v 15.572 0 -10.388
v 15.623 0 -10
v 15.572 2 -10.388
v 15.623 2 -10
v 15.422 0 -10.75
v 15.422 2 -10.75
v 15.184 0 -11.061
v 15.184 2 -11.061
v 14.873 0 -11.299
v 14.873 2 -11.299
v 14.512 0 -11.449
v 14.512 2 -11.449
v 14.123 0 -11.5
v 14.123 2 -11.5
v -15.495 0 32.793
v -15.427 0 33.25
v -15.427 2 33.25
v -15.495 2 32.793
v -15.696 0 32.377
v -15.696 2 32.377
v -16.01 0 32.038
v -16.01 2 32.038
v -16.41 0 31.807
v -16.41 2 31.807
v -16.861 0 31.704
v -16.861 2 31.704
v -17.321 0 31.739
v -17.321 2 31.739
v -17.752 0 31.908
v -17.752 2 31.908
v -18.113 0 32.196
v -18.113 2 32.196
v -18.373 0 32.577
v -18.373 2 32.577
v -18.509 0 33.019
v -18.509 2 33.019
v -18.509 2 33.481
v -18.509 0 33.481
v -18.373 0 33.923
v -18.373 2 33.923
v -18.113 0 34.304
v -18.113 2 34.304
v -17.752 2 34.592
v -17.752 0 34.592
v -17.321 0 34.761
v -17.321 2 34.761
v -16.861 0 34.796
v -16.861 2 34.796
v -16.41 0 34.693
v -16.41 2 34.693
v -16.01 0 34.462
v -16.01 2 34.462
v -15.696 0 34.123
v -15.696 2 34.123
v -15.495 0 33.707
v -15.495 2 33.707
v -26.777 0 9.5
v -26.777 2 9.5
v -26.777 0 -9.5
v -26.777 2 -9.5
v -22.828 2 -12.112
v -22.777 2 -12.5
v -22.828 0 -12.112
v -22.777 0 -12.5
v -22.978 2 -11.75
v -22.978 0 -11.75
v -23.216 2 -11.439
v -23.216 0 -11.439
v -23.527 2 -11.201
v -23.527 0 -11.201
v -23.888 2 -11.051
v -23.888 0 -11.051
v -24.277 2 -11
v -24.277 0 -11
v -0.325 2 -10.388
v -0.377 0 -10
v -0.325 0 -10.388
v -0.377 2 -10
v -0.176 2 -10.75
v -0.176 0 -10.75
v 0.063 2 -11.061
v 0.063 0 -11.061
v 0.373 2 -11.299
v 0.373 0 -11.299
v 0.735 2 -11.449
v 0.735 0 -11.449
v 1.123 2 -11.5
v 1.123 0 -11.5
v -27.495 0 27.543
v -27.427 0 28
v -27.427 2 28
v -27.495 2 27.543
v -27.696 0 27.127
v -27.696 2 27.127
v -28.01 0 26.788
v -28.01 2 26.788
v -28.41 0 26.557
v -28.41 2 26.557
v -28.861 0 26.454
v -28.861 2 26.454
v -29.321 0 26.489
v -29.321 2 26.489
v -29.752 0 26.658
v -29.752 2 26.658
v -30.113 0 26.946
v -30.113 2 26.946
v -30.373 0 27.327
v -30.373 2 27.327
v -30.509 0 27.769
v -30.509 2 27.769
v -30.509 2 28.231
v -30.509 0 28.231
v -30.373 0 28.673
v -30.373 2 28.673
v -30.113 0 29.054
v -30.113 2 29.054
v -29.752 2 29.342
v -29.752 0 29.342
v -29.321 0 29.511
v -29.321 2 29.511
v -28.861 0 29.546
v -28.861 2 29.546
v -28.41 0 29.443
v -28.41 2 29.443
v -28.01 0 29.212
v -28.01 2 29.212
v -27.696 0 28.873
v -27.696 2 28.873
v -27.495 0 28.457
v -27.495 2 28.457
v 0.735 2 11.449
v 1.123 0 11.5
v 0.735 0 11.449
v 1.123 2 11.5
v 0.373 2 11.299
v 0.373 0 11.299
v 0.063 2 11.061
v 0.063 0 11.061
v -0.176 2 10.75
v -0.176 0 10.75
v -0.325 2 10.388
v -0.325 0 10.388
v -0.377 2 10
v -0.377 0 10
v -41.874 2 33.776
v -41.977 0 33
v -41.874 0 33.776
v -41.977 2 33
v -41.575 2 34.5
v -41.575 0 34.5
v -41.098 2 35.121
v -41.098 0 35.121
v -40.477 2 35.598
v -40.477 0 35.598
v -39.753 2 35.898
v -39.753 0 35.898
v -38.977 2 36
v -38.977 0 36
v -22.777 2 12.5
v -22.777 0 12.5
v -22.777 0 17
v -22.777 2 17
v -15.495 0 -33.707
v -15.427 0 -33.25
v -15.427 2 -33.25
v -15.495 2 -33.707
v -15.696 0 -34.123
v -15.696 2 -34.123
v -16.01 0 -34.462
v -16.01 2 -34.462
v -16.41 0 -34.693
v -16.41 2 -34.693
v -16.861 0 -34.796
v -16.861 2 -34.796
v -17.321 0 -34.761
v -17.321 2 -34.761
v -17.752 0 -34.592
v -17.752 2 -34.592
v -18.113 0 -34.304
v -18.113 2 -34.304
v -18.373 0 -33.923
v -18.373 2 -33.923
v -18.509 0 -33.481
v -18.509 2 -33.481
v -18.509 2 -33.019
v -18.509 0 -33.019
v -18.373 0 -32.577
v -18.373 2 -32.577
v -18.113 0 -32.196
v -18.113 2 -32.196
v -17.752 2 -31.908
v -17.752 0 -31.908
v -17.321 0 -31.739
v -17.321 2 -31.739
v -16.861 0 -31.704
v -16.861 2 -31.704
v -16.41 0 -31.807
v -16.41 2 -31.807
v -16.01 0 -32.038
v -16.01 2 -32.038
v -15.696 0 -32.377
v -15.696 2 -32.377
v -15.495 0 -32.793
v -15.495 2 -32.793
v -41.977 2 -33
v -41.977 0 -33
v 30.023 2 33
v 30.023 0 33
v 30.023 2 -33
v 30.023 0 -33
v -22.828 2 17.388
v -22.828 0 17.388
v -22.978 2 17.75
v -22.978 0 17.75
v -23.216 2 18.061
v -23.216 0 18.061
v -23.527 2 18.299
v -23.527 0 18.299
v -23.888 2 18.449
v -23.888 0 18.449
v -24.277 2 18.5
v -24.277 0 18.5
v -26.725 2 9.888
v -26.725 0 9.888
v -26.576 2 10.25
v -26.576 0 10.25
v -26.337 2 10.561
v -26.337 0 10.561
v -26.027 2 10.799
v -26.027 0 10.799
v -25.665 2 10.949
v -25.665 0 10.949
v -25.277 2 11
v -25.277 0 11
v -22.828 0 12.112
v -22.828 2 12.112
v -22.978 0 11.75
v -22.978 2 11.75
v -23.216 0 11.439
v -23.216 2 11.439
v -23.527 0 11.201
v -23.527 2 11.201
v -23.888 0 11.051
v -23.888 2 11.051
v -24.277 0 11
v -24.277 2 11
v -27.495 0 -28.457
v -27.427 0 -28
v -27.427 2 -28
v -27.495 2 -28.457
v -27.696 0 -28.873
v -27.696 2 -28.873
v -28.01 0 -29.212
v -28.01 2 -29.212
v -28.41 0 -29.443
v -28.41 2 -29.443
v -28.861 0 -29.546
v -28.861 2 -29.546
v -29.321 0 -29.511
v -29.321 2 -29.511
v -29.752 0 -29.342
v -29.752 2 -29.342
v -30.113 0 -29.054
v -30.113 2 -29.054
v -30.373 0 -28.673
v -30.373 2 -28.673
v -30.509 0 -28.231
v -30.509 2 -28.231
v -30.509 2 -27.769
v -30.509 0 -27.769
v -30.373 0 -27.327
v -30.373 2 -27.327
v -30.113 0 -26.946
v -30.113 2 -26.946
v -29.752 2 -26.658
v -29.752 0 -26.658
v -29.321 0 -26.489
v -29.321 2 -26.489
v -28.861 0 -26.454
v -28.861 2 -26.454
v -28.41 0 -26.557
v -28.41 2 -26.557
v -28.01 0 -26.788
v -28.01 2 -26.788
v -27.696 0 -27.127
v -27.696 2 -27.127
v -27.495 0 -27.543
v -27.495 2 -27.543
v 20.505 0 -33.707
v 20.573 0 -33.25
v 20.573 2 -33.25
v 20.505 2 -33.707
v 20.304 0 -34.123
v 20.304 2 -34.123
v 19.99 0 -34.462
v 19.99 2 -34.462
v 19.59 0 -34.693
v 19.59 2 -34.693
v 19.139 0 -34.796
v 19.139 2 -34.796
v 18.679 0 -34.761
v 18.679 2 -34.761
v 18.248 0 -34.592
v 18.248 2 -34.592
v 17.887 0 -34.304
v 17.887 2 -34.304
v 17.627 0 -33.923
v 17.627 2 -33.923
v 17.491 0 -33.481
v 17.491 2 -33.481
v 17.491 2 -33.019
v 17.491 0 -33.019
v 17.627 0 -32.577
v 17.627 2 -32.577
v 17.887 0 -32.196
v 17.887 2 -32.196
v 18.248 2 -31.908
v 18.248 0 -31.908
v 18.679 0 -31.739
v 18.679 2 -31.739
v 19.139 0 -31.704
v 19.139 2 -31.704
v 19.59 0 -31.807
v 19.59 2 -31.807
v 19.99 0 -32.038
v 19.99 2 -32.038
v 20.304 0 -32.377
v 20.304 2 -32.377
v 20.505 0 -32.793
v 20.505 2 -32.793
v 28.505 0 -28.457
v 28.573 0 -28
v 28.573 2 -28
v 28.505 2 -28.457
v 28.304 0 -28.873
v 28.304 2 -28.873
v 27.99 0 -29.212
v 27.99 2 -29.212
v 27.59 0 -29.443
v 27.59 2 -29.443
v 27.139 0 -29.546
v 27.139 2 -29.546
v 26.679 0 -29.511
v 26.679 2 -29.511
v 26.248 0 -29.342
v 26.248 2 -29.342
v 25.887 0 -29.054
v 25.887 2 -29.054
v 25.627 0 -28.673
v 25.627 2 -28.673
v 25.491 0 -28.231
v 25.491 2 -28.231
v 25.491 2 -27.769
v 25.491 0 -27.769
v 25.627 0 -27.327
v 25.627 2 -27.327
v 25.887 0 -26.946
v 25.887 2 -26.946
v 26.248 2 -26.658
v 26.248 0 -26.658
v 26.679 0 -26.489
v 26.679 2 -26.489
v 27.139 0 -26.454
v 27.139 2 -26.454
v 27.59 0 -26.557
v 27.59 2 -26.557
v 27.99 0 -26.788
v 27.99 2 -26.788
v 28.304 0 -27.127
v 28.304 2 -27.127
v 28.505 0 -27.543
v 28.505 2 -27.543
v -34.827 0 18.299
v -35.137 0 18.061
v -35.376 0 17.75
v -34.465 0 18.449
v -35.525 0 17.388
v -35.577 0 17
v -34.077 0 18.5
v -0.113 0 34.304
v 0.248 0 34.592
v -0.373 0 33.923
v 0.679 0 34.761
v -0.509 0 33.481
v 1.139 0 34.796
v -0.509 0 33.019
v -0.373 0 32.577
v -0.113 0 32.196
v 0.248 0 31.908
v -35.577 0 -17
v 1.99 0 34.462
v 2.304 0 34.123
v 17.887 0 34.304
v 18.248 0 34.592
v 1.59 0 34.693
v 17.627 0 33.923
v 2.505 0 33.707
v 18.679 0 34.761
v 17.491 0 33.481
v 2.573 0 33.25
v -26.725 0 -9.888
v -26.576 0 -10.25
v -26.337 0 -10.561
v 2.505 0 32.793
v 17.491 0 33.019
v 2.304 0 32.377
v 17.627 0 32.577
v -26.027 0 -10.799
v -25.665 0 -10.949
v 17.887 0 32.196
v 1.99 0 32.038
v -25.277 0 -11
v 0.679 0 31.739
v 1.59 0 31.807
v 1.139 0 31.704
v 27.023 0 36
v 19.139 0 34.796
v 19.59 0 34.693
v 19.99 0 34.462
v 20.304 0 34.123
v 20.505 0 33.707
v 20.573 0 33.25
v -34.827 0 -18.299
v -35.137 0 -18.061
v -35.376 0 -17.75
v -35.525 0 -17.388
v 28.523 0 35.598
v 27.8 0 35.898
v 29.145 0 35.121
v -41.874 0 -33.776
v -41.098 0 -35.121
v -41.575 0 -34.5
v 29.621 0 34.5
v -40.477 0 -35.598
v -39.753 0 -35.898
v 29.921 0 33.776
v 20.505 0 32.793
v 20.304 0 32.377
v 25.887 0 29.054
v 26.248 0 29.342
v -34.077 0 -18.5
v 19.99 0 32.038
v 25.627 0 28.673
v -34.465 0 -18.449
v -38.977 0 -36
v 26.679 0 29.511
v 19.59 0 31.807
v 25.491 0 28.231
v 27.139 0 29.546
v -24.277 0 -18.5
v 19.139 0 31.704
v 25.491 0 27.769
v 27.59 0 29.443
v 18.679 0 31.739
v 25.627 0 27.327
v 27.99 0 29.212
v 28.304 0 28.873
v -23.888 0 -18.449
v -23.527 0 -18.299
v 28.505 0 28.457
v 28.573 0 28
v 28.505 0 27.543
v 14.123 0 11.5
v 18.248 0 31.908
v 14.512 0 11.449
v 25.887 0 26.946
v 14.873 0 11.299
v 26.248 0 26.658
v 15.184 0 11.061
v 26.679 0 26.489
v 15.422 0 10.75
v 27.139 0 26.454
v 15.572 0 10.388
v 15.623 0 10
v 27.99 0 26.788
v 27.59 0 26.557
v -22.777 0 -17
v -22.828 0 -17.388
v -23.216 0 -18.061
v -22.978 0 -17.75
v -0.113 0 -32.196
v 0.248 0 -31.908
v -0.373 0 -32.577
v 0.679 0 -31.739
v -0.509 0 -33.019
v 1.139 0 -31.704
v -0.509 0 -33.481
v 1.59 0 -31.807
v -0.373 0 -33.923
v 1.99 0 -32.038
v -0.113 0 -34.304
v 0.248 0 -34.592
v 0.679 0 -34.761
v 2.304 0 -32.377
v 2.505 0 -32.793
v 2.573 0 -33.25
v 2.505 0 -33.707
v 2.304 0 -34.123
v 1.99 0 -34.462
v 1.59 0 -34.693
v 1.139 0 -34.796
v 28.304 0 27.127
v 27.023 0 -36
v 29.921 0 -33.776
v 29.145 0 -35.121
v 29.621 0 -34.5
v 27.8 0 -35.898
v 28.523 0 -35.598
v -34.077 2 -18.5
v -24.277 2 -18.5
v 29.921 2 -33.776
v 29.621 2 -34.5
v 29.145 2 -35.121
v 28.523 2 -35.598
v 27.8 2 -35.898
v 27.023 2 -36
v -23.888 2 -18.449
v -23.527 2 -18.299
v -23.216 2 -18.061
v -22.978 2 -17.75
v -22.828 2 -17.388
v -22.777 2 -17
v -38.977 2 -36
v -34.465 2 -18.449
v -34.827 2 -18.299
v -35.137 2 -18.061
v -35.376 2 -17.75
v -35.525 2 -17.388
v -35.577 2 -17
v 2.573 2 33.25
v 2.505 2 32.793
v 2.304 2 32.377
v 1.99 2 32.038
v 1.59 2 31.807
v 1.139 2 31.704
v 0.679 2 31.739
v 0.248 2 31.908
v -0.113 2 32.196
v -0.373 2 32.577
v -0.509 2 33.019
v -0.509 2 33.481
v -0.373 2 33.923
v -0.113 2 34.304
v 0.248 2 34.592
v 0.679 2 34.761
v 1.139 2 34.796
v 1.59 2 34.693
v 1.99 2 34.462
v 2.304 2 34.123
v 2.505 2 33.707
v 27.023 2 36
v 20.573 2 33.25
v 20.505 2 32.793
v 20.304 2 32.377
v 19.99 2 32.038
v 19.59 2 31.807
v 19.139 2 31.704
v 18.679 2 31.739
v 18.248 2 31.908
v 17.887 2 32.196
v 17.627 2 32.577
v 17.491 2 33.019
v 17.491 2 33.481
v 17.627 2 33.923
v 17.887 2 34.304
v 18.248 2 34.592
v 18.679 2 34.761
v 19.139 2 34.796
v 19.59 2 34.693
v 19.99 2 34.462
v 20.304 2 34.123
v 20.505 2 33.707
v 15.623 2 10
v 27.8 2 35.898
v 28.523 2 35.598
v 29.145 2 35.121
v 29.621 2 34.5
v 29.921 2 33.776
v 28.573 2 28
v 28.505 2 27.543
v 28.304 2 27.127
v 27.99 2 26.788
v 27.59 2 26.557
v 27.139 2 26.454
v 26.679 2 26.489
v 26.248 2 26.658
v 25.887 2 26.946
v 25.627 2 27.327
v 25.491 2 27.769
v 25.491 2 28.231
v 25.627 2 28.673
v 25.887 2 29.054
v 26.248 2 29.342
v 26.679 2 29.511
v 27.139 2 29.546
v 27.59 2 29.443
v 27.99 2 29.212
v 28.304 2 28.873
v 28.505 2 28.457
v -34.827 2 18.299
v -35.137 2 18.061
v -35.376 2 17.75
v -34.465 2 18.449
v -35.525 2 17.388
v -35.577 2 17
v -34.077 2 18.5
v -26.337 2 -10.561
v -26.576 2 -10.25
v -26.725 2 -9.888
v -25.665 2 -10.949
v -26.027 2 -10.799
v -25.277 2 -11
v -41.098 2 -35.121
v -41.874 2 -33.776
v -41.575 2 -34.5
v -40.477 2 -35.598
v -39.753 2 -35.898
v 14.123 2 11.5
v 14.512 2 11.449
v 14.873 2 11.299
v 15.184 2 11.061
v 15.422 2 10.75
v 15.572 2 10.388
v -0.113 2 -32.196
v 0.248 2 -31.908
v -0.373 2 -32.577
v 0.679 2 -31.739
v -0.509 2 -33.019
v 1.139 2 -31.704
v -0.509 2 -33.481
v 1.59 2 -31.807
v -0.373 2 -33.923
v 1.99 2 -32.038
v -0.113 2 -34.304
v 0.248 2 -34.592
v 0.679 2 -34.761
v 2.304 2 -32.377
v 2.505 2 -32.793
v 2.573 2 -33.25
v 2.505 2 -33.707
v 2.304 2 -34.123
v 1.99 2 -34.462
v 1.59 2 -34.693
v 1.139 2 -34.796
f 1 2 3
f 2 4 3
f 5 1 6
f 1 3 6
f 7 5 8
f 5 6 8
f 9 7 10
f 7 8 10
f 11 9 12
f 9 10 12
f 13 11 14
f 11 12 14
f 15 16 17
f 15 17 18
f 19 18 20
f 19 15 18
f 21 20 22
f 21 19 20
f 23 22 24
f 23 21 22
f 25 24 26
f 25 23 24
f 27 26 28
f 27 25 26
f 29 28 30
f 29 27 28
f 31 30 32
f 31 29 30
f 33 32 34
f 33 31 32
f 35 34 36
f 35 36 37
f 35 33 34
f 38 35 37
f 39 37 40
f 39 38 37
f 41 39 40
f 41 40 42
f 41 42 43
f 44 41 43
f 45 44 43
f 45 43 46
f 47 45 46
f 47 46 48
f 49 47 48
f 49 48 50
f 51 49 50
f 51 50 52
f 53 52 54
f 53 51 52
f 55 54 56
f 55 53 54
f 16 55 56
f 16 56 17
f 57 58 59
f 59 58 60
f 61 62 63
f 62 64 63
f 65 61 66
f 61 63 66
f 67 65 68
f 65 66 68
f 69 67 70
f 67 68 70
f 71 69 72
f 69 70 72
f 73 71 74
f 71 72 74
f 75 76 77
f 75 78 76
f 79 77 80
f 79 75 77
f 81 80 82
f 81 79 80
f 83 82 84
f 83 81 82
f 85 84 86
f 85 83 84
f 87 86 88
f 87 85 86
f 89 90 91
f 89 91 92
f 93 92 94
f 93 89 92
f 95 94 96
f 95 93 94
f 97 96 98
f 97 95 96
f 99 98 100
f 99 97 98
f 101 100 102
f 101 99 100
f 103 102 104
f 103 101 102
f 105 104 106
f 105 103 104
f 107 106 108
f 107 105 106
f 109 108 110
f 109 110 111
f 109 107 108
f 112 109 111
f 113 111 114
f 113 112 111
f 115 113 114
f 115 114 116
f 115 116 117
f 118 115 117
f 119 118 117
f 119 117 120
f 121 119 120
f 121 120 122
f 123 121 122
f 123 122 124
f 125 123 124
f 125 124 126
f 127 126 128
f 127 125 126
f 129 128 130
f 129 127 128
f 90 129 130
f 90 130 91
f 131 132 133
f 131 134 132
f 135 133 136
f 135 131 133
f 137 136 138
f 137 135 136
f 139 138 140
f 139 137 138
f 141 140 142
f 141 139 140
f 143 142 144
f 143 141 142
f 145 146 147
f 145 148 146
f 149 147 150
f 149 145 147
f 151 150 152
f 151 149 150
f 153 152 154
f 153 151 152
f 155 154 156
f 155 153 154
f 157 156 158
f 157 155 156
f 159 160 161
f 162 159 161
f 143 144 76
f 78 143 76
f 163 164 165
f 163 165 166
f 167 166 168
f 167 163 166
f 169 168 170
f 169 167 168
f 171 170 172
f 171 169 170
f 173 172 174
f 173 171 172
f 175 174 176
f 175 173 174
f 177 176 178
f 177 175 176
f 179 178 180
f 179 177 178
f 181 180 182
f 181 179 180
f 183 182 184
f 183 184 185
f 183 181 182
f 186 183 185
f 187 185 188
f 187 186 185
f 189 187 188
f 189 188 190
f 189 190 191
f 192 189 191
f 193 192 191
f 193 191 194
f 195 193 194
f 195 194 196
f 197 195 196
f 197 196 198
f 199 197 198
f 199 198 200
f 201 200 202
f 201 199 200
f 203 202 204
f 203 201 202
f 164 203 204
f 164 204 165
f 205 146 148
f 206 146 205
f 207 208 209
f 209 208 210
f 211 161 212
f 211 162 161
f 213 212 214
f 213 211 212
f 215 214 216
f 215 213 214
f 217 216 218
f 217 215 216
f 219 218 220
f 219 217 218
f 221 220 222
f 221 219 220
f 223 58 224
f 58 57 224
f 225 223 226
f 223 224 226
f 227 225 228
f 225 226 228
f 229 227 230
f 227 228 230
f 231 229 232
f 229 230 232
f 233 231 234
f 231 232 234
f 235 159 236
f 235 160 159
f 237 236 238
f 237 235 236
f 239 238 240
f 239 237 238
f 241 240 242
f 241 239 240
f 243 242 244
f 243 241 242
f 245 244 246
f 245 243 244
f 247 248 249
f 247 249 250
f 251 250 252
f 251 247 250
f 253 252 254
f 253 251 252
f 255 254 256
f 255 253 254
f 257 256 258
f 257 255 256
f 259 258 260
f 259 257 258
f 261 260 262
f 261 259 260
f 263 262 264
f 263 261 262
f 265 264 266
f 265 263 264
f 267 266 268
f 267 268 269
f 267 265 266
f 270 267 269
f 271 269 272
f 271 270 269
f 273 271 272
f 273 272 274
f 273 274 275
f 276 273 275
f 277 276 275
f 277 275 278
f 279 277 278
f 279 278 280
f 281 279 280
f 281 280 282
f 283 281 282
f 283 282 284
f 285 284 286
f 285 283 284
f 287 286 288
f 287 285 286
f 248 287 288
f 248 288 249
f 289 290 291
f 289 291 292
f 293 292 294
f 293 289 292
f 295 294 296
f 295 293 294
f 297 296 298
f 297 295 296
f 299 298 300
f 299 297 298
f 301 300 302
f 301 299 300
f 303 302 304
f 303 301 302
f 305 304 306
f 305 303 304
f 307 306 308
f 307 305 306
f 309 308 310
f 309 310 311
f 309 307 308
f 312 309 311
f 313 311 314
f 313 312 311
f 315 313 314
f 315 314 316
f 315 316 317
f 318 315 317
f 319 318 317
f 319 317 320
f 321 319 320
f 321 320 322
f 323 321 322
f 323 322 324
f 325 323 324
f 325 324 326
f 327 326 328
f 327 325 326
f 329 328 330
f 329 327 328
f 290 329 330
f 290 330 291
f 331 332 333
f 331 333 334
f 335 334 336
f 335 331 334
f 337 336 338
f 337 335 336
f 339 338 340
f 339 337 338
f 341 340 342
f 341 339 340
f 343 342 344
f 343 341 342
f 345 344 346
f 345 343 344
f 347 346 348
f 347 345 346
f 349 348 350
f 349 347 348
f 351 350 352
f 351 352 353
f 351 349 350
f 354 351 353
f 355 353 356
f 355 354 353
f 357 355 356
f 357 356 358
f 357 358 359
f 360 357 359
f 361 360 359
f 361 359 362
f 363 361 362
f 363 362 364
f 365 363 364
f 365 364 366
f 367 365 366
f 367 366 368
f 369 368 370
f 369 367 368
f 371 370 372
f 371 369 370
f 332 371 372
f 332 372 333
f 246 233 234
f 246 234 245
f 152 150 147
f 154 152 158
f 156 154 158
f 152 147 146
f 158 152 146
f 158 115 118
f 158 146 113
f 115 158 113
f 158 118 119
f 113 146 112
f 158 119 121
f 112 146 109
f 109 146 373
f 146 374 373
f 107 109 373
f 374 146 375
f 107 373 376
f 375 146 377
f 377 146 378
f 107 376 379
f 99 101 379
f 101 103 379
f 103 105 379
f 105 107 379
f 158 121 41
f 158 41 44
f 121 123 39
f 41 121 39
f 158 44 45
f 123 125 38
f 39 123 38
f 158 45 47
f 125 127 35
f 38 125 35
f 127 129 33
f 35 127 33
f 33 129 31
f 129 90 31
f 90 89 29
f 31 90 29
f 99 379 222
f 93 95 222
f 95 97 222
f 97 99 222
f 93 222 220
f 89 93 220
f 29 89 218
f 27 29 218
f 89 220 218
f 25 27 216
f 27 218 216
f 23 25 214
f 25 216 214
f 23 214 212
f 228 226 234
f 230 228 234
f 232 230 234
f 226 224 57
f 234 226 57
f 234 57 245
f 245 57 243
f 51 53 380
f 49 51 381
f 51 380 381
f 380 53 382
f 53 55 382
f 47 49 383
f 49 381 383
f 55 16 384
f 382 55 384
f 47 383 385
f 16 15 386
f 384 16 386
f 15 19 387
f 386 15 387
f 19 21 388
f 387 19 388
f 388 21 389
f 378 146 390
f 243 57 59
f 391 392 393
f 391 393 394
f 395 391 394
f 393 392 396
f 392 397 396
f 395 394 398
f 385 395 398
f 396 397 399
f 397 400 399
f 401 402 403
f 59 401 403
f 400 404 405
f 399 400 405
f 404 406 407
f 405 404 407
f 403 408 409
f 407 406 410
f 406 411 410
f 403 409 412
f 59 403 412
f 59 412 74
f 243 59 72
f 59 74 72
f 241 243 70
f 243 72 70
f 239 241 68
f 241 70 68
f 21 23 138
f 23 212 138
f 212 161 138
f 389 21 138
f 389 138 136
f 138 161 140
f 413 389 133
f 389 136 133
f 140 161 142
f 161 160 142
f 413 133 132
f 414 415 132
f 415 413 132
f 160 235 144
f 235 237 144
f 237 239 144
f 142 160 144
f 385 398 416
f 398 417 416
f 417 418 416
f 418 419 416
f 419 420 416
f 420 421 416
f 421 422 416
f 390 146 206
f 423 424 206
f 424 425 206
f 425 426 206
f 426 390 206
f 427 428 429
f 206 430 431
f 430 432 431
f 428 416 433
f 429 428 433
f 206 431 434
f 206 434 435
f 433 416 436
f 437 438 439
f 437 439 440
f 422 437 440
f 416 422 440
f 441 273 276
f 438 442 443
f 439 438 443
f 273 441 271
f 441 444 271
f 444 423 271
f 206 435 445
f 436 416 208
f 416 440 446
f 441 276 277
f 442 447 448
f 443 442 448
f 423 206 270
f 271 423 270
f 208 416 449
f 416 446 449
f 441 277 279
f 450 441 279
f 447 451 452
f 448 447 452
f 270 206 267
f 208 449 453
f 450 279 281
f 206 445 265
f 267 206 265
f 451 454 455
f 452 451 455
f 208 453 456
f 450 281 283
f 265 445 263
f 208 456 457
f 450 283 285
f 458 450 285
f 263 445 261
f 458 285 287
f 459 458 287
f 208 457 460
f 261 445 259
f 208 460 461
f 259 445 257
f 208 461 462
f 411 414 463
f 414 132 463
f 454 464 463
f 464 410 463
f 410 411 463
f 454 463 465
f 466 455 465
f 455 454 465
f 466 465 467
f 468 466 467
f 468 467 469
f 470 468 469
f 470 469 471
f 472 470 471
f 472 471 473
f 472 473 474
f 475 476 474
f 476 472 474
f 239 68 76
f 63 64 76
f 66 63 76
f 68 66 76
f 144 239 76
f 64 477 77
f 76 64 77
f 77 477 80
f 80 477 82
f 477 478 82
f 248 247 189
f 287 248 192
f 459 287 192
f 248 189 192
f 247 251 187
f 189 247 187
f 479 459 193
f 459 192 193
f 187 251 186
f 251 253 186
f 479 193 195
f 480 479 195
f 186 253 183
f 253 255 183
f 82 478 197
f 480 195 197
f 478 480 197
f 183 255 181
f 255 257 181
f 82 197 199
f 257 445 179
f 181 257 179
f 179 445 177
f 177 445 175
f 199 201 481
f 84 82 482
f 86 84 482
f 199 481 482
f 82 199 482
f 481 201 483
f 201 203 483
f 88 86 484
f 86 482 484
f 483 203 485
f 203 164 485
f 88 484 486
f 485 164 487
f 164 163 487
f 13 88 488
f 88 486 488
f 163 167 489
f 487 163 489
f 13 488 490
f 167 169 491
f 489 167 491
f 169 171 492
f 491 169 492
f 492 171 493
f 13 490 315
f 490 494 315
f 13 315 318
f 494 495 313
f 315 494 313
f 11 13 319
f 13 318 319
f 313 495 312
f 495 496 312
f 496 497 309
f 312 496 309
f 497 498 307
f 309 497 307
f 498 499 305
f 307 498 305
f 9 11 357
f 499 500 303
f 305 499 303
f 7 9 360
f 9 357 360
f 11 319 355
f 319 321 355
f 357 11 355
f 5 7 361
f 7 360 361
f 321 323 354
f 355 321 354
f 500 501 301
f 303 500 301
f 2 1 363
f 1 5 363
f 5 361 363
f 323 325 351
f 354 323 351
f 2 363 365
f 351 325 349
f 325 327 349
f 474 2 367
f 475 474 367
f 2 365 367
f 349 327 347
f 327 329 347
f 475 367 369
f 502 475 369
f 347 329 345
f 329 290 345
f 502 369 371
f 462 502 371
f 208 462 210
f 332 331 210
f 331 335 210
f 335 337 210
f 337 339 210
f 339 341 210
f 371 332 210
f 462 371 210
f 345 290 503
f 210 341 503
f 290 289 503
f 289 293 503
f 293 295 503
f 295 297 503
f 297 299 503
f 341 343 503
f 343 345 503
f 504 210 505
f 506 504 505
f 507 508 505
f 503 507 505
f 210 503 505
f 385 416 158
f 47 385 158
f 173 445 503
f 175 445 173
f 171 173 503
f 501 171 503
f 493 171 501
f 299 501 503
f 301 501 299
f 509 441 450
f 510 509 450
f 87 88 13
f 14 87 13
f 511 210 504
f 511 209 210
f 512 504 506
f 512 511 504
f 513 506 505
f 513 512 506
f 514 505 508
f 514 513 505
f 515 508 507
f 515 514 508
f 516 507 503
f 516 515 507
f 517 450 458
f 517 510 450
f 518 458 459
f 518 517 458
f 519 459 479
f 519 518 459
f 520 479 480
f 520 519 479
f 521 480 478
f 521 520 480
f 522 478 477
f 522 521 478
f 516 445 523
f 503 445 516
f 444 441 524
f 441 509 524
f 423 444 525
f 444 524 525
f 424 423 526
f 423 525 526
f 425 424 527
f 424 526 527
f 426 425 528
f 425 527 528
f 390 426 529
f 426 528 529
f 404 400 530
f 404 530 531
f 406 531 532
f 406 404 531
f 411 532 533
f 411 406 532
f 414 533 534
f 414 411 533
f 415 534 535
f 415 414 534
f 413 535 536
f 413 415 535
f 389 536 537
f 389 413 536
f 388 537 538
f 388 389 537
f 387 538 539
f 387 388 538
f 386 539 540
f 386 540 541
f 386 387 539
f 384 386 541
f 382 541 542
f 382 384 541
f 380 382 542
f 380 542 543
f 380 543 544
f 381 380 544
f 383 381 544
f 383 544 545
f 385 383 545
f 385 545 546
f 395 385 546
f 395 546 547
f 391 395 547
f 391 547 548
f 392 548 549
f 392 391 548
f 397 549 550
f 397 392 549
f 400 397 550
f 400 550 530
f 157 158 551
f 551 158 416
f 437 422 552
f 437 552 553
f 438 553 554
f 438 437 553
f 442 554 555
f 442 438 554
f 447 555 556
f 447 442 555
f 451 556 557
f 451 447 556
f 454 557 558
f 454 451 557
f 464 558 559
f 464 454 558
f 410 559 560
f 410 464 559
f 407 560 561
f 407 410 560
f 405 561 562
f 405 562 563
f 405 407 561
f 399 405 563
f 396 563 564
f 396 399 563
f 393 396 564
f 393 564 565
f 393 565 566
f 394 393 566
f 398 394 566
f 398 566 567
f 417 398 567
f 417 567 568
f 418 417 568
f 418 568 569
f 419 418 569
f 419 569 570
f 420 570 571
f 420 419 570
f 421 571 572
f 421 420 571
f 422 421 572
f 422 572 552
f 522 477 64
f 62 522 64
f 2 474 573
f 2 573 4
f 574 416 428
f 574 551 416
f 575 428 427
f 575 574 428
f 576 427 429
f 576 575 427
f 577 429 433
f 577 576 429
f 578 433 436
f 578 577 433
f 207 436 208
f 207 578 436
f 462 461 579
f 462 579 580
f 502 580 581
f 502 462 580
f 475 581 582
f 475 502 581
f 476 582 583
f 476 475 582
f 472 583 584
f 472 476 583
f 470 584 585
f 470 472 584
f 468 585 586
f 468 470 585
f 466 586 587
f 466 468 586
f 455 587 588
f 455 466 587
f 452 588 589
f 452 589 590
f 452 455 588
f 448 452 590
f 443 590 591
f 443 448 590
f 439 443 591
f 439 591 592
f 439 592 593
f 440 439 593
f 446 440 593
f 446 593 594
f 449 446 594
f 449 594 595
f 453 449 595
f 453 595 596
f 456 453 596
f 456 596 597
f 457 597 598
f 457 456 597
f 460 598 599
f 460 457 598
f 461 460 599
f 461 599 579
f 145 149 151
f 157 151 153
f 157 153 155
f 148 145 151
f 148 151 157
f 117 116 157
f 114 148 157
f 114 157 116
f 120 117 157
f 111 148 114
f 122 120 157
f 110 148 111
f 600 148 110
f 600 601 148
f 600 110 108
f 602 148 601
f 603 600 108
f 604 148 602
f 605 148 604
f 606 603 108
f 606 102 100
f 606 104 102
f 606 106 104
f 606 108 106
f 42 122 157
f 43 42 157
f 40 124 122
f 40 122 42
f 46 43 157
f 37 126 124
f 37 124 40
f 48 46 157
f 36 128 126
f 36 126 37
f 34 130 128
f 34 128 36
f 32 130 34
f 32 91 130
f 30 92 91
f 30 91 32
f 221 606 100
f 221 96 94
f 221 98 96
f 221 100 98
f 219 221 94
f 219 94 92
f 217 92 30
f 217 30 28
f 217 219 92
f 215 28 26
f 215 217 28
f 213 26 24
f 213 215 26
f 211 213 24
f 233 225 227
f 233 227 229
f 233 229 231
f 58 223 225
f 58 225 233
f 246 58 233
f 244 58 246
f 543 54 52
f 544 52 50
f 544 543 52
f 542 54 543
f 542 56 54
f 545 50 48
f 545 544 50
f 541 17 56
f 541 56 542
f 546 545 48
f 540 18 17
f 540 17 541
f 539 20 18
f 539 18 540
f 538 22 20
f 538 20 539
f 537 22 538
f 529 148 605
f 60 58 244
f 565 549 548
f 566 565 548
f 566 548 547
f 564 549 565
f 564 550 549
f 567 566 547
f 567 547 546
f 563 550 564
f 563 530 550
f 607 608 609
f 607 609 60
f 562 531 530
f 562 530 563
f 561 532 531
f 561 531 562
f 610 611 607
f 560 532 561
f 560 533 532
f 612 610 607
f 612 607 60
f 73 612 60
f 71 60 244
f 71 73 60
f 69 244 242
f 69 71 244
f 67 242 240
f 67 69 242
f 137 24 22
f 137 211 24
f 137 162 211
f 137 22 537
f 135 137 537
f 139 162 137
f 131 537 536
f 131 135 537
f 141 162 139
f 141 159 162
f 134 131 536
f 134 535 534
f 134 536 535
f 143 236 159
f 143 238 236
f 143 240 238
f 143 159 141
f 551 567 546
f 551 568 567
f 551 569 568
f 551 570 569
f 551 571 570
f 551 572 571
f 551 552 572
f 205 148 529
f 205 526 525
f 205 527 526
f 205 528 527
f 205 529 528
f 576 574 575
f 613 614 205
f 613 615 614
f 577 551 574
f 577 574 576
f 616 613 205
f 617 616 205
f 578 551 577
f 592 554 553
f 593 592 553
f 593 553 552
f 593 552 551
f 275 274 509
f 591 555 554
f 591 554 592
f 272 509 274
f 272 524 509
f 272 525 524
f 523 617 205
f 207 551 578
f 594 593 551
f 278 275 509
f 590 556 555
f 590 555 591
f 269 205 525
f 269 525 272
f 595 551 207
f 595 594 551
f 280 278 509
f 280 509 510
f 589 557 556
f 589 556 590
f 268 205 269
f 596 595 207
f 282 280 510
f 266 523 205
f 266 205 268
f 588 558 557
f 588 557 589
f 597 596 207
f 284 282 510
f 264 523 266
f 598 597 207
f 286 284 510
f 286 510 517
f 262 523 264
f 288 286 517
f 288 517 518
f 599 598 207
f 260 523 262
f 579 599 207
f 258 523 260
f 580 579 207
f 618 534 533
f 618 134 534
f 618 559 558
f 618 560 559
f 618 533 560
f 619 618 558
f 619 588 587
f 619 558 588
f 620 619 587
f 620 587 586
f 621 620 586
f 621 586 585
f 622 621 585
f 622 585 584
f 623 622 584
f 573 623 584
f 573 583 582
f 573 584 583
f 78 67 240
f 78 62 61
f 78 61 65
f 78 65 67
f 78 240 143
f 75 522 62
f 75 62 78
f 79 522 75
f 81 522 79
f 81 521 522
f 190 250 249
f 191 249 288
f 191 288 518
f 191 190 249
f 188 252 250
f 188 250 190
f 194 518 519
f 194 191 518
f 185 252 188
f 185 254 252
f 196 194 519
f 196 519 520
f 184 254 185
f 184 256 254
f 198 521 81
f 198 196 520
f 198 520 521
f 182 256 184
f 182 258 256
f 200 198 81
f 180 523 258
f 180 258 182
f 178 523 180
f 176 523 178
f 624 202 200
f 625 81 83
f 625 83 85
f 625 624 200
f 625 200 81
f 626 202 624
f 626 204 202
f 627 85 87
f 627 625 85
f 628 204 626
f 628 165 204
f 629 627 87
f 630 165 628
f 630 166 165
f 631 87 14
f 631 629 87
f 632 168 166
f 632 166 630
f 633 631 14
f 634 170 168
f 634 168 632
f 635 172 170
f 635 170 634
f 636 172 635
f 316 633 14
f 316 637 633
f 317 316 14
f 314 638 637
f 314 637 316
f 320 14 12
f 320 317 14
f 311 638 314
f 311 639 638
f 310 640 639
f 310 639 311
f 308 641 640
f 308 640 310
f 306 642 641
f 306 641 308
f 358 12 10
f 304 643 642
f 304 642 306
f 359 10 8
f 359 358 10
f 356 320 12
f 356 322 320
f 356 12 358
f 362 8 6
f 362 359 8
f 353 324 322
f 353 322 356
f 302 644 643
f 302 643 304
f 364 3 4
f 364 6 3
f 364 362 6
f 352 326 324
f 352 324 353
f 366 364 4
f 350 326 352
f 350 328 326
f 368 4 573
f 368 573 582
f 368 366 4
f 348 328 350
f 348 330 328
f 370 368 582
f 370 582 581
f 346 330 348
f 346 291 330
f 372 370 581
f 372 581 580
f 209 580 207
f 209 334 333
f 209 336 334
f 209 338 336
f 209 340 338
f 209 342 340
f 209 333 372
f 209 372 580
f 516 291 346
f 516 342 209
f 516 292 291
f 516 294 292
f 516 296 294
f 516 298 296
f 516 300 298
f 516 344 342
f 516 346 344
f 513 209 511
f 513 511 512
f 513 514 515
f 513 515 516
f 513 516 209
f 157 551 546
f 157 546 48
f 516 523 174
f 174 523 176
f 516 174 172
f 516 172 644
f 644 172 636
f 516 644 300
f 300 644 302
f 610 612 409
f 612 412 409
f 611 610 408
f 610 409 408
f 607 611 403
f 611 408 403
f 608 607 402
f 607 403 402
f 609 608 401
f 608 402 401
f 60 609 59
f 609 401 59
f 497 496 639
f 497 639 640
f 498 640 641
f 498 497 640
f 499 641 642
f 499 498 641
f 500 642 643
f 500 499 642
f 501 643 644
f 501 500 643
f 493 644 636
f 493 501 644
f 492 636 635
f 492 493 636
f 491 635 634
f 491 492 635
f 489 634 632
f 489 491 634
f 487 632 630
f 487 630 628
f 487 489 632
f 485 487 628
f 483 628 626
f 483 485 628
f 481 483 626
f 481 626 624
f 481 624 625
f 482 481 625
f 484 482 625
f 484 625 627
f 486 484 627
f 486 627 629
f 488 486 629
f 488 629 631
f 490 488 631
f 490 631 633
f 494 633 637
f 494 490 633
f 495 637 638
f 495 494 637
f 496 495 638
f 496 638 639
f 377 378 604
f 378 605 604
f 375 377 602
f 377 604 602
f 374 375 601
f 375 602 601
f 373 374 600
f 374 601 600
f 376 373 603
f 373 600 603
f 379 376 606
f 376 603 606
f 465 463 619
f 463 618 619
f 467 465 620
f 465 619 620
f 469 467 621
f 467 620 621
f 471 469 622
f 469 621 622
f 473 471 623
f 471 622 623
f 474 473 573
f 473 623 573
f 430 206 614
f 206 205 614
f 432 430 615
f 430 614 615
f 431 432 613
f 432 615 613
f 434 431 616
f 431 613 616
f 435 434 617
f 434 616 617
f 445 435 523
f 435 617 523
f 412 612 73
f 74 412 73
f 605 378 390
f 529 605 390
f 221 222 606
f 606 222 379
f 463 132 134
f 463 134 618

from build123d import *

# Parameters (mm, degrees)
SKETCH1_W           = 72
SKETCH1_H           = 72
SKETCH1_R           = 1.55
SKETCH1_W_2         = 16
SKETCH1_H_2         = 23
BOSS_EXTRUDE1_DEPTH = 2
FILLET1_R           = 1.5
SKETCH2_W           = 4
SKETCH2_H           = 22
BOSS_EXTRUDE2_DEPTH = 2
FILLET3_R           = 1.5
FILLET5_R           = 3


with BuildPart() as part:
    # Sketch1 → Boss-Extrude1 (new body)
    with BuildSketch(Plane(origin=(0, 0, 0), x_dir=(1, 0, 0), z_dir=(0, 1, 0))):
        with Locations((-5.976585554, 0)):
            Rectangle(SKETCH1_W, SKETCH1_H)
        with Locations((-28.976585554, -28)):
            Circle(SKETCH1_R, mode=Mode.SUBTRACT)
        with Locations((-16.976585554, -33.25)):
            Circle(SKETCH1_R, mode=Mode.SUBTRACT)
        Polygon((-22.776585554, 18.5), (-22.776585554, -18.5), (-27, -18.5), (-35.576585554, -18.5), (-35.576585554, 18.5), (-31.976585554, 18.5), align=None, mode=Mode.SUBTRACT)
        with Locations((1.023414446, -33.25)):
            Circle(SKETCH1_R, mode=Mode.SUBTRACT)
        with Locations((19.023414446, -33.25)):
            Circle(SKETCH1_R, mode=Mode.SUBTRACT)
        with Locations((27.023414446, -28)):
            Circle(SKETCH1_R, mode=Mode.SUBTRACT)
        with Locations((-28.976585554, 28)):
            Circle(SKETCH1_R, mode=Mode.SUBTRACT)
        with Locations((-16.976585554, 33.25)):
            Circle(SKETCH1_R, mode=Mode.SUBTRACT)
        with Locations((7.623414446, 0)):
            Rectangle(SKETCH1_W_2, SKETCH1_H_2, mode=Mode.SUBTRACT)
        with Locations((1.023414446, 33.25)):
            Circle(SKETCH1_R, mode=Mode.SUBTRACT)
        with Locations((19.023414446, 33.25)):
            Circle(SKETCH1_R, mode=Mode.SUBTRACT)
        with Locations((27.023414446, 28)):
            Circle(SKETCH1_R, mode=Mode.SUBTRACT)
    extrude(amount=BOSS_EXTRUDE1_DEPTH)

    # Fillet1
    fillet1_edges = [part.edges().sort_by_distance(p)[0] for p in [
        (-0.376585554, 1, 11.5),
        (15.623414446, 1, 11.5),
        (15.623414446, 1, -11.5),
        (-0.376585554, 1, -11.5),
        (-35.576585554, 1, 18.5),
        (-22.776585554, 1, 18.5),
        (-22.776585554, 1, -18.5),
        (-35.576585554, 1, -18.5),
    ]]
    fillet(fillet1_edges, radius=FILLET1_R)

    # Sketch2 → Boss-Extrude2 (add)
    with BuildSketch(Plane(origin=(0, 2, 0), x_dir=(1, 0, 0), z_dir=(0, 1, 0))):
        with Locations((-24.776585554, 0)):
            Rectangle(SKETCH2_W, SKETCH2_H)
    extrude(amount=-BOSS_EXTRUDE2_DEPTH)

    # Fillet3
    fillet3_edges = [part.edges().sort_by_distance(p)[0] for p in [
        (-26.776585554, 1, 11),
        (-26.776585554, 1, -11),
        (-22.776585554, 1, -11),
        (-22.776585554, 1, 11),
    ]]
    fillet(fillet3_edges, radius=FILLET3_R)

    # Fillet5
    fillet5_edges = [part.edges().sort_by_distance(p)[0] for p in [
        (-41.976585554, 1, -36),
        (30.023414446, 1, -36),
        (30.023414446, 1, 36),
        (-41.976585554, 1, 36),
    ]]
    fillet(fillet5_edges, radius=FILLET5_R)


solid = part.part
